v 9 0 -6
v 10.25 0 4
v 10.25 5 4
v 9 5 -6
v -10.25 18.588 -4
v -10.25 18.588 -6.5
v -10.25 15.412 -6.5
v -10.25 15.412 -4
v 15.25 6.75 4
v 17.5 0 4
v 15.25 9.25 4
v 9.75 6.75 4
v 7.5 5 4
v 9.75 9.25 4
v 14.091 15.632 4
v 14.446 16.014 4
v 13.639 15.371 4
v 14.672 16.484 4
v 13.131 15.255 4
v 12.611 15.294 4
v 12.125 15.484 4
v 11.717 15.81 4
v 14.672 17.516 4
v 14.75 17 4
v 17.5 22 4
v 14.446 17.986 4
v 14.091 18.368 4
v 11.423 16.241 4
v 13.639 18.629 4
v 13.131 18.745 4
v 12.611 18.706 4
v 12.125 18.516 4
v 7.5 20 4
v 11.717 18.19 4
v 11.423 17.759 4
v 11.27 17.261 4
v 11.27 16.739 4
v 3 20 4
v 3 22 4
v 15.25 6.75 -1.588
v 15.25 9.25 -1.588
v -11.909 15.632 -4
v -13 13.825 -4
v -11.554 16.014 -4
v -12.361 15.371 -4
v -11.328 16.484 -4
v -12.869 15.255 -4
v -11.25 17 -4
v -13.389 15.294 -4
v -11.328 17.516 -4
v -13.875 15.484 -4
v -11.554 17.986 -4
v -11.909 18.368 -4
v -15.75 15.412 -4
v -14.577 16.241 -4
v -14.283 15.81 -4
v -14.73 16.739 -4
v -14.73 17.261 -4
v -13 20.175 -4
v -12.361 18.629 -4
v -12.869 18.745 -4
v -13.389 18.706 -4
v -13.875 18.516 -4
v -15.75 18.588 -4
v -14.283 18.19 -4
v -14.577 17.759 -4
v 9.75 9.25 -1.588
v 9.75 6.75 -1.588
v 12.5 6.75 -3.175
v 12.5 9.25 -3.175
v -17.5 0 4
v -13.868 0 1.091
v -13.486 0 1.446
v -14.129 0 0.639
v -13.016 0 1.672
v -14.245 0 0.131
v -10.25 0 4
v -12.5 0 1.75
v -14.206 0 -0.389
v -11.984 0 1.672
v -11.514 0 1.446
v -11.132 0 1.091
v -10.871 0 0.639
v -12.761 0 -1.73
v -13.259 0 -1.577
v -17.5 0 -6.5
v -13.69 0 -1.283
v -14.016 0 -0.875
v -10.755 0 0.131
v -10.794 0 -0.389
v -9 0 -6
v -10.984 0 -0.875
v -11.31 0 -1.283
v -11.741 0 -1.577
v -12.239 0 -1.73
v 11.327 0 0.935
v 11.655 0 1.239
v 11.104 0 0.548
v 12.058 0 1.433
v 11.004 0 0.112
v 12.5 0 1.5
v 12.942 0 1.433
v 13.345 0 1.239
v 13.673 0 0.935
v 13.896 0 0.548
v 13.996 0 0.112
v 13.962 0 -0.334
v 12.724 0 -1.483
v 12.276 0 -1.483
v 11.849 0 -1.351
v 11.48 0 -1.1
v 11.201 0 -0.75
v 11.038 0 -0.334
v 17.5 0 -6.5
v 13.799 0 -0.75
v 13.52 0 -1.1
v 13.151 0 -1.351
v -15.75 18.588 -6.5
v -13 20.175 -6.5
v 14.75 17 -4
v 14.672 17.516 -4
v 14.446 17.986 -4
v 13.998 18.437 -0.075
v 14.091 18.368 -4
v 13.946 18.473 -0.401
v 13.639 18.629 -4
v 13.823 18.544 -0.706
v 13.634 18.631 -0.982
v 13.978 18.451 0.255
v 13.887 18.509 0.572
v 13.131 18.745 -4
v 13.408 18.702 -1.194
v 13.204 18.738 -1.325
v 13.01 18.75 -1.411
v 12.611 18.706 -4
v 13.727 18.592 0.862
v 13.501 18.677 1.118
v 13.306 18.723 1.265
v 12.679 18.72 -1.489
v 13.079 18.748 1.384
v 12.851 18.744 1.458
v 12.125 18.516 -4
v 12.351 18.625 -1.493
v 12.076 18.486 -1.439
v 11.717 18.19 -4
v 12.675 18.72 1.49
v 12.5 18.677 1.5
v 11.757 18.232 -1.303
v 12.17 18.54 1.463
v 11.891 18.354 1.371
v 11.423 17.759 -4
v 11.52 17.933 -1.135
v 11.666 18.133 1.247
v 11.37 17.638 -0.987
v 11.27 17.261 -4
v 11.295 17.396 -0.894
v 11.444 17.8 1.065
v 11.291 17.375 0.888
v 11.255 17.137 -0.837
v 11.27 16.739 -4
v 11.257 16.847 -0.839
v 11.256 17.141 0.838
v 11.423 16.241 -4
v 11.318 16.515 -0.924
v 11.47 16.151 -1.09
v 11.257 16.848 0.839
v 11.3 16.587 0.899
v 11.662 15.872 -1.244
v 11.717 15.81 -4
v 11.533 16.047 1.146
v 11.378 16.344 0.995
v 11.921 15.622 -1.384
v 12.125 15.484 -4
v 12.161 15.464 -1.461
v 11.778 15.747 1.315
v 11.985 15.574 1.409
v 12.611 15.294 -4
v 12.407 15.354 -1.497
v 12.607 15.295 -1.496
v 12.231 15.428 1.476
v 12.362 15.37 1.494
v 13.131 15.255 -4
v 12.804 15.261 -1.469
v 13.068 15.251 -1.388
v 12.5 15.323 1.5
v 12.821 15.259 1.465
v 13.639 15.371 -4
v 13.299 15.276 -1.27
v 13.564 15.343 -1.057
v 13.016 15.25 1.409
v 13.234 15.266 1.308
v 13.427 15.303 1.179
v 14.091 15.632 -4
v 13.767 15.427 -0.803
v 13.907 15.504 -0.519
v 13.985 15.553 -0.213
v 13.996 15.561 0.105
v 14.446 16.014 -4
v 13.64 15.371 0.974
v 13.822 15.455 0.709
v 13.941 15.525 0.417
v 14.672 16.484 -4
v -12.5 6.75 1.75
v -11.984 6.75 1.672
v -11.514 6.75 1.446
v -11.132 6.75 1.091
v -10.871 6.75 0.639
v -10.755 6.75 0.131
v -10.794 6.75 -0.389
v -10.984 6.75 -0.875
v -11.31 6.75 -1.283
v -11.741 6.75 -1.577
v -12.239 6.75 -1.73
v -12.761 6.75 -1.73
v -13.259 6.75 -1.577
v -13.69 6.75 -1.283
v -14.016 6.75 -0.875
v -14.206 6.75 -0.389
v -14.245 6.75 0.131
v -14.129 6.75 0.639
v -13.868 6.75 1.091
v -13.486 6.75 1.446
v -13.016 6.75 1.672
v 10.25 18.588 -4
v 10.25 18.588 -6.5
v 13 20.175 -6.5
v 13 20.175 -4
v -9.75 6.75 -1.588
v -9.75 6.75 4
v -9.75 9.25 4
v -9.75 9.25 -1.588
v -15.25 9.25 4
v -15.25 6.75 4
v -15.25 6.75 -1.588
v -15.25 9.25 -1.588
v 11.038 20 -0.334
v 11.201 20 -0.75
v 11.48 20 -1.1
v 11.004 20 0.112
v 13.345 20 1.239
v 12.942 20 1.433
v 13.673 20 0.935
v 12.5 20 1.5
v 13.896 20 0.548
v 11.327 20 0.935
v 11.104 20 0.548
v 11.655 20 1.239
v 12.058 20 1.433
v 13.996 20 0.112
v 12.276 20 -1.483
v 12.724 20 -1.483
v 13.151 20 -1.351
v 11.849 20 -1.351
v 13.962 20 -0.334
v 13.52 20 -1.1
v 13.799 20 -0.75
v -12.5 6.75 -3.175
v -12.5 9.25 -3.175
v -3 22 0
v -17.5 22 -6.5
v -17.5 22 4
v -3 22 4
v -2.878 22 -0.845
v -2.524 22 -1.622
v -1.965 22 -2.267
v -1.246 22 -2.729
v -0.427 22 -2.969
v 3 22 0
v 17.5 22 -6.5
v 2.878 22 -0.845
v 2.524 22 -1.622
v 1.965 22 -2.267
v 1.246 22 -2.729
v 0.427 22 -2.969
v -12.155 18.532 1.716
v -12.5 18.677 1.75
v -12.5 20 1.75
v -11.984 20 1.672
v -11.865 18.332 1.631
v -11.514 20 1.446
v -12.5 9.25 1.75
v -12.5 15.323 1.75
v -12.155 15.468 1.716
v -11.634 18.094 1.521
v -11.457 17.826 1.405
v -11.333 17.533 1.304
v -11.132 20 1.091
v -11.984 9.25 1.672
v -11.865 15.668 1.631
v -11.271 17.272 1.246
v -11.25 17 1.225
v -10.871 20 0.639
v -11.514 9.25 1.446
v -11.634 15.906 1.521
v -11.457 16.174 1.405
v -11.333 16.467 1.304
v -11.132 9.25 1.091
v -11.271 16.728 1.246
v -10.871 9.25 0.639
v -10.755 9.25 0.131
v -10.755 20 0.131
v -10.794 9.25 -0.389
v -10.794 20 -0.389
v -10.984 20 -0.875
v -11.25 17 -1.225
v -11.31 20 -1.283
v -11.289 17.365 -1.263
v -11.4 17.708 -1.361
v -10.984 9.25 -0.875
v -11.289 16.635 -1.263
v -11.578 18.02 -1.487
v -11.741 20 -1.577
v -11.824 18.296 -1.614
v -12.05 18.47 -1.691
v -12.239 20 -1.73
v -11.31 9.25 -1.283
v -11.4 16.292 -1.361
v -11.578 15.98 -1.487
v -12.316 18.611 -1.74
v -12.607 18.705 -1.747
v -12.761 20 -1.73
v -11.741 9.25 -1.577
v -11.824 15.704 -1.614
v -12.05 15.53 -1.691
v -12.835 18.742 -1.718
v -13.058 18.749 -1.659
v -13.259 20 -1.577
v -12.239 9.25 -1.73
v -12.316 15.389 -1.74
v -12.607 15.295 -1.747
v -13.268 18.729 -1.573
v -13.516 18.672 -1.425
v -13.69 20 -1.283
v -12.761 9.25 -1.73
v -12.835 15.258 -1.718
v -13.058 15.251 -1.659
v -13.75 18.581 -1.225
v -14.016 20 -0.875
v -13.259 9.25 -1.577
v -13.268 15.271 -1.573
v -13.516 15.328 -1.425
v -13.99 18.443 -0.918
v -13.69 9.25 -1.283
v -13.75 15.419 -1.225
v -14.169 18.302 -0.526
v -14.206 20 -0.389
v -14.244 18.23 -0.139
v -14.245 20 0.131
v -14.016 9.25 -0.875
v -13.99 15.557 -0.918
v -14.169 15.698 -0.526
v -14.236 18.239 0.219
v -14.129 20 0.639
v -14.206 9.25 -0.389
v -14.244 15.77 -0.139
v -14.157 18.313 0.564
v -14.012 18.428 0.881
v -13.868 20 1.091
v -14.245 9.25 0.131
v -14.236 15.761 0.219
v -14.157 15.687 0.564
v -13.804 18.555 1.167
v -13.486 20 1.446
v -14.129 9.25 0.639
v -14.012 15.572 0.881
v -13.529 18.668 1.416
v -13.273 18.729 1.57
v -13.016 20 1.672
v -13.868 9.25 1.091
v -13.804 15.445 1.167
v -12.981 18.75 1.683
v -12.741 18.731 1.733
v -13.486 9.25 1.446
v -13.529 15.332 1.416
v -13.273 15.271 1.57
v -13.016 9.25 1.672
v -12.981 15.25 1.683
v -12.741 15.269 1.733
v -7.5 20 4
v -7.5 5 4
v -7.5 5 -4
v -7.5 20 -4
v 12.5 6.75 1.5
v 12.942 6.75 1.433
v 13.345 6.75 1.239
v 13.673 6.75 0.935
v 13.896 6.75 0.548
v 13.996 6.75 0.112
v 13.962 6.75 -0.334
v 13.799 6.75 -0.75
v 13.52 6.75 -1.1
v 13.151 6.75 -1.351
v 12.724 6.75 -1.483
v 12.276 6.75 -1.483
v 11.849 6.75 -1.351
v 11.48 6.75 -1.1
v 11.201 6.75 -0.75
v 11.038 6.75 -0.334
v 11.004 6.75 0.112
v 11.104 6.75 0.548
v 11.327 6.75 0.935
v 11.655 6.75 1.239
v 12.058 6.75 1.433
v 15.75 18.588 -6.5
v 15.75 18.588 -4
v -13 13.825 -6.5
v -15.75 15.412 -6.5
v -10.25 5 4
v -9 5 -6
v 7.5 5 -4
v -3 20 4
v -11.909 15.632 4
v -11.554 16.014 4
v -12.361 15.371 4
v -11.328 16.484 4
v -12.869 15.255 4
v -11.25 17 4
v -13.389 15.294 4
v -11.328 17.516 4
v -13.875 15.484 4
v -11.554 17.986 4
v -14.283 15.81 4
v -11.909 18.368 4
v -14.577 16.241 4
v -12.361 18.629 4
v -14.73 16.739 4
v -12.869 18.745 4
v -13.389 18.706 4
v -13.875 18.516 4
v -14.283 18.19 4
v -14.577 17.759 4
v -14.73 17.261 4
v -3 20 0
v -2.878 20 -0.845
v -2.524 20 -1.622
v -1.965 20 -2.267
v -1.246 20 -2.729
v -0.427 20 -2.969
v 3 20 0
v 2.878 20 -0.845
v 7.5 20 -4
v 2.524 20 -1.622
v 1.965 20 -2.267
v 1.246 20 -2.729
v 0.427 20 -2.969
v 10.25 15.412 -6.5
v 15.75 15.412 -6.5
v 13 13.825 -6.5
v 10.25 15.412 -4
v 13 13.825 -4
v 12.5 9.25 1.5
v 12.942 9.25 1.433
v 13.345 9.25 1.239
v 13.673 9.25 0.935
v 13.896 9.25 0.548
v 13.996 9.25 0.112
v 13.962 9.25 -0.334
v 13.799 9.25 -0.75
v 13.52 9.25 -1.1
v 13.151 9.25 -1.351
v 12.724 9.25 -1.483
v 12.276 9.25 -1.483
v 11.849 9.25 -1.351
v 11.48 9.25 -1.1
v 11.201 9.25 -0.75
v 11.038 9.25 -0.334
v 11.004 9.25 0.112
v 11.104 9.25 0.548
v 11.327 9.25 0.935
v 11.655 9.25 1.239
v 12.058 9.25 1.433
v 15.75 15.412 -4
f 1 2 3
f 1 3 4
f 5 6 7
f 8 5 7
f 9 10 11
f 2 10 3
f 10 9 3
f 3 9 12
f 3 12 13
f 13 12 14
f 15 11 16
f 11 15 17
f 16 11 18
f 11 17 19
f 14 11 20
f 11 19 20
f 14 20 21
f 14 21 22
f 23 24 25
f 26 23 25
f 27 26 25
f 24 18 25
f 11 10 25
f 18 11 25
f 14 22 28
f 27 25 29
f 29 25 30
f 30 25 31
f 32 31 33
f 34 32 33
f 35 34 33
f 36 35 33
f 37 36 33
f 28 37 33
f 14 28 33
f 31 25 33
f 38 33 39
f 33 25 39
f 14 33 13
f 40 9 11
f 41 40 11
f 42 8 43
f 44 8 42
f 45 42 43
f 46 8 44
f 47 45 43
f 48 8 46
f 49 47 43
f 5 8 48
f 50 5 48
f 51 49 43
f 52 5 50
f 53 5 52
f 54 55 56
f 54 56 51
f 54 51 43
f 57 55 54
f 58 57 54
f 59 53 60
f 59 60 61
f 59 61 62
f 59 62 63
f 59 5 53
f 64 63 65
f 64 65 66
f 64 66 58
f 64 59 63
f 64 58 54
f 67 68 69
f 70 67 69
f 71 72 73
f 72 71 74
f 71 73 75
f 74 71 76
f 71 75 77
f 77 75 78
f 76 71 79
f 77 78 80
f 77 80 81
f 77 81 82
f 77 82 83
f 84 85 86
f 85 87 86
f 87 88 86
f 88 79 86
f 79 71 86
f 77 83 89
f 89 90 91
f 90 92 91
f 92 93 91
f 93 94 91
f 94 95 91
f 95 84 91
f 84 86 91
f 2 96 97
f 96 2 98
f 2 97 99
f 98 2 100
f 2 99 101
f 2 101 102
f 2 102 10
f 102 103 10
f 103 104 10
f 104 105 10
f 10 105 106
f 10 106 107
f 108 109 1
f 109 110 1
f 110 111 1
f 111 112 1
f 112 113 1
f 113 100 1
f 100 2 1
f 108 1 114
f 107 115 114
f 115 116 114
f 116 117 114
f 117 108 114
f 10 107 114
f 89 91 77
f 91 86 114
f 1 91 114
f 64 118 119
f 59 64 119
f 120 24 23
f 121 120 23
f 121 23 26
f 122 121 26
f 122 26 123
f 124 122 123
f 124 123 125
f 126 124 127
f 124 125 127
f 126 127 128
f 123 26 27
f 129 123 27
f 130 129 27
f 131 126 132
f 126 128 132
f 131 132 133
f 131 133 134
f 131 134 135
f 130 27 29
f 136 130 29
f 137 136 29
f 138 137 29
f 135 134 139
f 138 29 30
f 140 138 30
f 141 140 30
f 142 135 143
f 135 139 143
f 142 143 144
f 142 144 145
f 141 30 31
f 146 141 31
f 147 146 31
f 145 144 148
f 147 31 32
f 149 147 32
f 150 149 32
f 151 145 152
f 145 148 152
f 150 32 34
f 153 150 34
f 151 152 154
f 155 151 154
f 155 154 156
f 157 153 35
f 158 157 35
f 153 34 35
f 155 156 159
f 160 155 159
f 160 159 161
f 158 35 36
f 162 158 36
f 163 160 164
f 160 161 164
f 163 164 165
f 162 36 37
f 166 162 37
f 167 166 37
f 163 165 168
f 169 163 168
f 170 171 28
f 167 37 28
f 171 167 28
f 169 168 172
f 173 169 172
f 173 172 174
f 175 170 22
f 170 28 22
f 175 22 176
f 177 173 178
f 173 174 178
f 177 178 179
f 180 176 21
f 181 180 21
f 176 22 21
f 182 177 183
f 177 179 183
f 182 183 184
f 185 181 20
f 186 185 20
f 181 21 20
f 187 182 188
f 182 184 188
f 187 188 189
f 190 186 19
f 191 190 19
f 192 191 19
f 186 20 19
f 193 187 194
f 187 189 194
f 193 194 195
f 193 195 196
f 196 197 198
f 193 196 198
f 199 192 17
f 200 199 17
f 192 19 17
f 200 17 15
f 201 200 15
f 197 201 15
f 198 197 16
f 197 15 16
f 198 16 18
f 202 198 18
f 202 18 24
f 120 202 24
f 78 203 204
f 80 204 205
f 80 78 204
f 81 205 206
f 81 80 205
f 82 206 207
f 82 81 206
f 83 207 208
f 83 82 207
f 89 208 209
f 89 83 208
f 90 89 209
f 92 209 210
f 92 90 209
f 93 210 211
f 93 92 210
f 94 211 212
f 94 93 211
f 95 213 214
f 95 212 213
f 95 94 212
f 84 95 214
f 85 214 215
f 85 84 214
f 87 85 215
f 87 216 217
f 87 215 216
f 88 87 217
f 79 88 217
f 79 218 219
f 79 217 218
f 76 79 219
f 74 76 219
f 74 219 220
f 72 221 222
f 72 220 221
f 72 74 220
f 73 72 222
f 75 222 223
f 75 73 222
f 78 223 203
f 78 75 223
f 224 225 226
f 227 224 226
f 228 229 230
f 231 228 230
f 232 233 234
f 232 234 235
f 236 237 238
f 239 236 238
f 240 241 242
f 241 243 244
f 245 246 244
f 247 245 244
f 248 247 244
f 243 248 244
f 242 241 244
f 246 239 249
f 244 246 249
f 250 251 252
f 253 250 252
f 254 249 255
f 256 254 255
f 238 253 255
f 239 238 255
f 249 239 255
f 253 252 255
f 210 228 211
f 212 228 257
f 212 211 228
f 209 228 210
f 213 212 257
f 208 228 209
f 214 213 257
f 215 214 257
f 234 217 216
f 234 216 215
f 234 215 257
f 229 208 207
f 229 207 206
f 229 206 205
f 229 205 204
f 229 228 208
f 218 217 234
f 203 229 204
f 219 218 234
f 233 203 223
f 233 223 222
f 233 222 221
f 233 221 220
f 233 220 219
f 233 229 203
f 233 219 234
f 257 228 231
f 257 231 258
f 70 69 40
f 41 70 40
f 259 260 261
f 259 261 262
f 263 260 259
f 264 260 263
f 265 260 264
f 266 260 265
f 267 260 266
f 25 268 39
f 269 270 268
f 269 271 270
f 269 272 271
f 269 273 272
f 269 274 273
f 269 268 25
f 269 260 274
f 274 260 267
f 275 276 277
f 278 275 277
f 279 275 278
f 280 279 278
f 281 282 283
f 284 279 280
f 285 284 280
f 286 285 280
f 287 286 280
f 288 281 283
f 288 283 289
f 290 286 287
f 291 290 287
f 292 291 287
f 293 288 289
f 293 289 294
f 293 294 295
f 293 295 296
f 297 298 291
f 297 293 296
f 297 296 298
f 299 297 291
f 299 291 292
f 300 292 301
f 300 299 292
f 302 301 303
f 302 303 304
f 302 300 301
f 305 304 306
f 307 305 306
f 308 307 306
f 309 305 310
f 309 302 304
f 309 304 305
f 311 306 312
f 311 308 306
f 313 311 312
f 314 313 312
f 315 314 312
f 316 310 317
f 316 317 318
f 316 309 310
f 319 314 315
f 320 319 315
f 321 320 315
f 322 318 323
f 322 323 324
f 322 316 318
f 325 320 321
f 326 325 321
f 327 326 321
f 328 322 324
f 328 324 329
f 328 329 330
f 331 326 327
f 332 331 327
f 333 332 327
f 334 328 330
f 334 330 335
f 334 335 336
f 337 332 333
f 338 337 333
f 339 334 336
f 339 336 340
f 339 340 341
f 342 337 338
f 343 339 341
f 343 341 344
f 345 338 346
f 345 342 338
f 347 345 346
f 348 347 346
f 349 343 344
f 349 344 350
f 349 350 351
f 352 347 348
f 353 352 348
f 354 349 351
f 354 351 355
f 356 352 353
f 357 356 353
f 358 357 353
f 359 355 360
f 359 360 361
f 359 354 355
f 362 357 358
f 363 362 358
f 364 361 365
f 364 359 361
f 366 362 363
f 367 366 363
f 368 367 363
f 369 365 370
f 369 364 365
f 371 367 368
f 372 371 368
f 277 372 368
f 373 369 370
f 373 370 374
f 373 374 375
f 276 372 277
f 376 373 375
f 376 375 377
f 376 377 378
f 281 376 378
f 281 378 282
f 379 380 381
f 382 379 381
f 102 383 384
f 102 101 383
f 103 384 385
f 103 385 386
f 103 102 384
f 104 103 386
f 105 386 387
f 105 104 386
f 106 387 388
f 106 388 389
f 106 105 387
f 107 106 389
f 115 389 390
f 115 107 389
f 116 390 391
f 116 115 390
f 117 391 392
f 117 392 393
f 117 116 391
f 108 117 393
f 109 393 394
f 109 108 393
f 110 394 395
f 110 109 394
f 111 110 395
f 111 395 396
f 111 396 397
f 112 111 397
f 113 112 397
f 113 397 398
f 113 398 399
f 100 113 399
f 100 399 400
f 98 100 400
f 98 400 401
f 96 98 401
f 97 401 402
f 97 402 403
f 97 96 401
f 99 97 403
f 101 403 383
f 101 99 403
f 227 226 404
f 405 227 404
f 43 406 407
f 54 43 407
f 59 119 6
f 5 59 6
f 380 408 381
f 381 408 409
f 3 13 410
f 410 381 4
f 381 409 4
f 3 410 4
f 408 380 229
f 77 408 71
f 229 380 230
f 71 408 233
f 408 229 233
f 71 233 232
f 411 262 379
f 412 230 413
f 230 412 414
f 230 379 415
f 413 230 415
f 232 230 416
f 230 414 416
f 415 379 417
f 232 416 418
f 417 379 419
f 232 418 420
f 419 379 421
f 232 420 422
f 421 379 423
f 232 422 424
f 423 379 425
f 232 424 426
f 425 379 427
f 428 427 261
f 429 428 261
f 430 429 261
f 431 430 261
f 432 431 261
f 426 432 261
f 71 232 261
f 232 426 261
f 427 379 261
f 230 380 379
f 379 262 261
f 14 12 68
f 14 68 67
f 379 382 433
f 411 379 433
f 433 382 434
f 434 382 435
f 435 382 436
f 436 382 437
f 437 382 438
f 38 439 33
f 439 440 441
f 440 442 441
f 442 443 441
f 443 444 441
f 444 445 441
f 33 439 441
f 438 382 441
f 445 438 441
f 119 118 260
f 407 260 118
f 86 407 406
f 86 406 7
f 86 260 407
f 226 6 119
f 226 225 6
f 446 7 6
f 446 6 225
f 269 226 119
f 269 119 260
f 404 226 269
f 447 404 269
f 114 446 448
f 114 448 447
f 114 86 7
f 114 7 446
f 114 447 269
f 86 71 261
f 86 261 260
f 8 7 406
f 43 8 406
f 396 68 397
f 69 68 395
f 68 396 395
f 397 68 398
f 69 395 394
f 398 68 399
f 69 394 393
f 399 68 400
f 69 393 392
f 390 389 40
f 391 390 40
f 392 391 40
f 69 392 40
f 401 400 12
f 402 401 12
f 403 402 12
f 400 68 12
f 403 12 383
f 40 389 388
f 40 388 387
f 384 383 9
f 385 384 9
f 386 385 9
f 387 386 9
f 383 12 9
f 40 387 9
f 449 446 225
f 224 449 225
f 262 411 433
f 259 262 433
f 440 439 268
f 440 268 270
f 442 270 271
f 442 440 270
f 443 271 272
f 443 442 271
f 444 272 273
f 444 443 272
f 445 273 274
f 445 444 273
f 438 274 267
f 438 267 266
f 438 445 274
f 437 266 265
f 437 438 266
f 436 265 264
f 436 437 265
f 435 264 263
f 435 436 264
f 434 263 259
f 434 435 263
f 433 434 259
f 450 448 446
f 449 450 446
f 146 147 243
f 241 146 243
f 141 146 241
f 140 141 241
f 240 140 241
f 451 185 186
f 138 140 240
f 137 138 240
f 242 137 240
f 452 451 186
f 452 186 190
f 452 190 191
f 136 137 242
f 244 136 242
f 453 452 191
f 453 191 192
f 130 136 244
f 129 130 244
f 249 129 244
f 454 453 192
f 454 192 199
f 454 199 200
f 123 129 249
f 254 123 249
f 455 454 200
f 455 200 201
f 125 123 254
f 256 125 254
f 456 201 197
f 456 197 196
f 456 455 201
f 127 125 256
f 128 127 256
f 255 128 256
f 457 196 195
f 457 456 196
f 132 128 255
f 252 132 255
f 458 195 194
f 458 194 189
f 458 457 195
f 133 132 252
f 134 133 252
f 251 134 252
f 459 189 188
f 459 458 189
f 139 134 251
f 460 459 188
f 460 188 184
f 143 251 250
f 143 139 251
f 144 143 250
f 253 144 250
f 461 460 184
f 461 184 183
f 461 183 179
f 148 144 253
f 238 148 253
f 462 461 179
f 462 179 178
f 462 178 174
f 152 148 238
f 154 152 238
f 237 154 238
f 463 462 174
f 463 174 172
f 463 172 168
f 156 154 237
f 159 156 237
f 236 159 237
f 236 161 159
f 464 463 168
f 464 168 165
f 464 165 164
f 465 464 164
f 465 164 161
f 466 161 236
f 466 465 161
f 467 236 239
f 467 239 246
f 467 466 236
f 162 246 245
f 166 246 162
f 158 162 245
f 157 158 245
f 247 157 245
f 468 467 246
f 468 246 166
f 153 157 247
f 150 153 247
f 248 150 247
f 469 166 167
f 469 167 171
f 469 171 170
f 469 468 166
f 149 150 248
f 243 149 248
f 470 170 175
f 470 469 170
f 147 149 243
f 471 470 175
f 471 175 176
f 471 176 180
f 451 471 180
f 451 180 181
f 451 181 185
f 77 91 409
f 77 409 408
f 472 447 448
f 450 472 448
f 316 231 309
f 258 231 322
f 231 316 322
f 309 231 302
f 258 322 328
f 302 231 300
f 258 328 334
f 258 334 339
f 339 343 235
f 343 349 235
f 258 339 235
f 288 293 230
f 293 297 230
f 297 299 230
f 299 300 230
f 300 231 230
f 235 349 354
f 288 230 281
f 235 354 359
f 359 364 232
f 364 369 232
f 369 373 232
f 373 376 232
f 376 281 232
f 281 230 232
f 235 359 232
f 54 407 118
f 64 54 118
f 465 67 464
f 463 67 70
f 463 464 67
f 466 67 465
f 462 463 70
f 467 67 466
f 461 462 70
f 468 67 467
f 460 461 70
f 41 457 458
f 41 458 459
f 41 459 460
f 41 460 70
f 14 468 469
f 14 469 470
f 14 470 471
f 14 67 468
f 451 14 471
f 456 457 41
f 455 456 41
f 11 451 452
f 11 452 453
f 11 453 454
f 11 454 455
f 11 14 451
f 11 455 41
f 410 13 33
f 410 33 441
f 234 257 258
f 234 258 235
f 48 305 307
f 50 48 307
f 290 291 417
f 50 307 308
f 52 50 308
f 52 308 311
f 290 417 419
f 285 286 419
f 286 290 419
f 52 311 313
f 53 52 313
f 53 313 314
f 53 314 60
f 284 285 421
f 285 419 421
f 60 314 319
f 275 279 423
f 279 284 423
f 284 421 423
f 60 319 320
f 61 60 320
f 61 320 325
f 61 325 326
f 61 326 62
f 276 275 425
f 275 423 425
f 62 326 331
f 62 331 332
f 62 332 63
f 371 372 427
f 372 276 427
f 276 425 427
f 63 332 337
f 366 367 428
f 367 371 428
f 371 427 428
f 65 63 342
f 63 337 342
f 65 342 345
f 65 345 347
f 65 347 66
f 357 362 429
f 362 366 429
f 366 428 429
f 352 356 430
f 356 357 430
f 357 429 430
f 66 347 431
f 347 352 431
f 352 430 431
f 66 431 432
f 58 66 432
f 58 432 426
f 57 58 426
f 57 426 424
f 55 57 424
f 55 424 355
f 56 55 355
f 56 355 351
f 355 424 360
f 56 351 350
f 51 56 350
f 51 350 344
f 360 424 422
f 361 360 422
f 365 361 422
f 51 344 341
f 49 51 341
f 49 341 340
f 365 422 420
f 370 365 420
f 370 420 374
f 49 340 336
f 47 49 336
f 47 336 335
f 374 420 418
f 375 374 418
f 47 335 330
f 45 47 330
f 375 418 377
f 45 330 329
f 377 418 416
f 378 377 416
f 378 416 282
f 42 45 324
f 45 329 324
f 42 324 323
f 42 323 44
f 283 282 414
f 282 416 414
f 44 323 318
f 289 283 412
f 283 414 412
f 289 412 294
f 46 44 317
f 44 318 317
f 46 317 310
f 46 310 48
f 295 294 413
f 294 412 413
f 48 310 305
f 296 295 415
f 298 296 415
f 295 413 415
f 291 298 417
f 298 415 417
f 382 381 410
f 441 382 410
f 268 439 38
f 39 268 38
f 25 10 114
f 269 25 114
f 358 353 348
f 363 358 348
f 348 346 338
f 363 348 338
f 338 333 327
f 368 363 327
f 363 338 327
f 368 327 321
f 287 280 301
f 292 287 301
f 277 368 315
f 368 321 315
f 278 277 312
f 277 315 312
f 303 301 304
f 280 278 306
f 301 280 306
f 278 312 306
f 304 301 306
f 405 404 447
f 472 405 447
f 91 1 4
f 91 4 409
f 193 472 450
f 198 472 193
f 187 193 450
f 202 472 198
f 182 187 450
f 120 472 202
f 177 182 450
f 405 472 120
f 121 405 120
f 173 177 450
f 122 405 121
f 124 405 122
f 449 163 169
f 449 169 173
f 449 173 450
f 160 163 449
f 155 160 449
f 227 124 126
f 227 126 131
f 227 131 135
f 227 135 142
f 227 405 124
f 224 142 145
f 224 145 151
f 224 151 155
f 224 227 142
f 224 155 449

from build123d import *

# Parameters (mm, degrees)
ESQUISSE1_W             = 35
ESQUISSE1_H             = 13
ESQUISSE1_R             = 1.75
ESQUISSE1_R_2           = 1.5
BOSS_EXTRU_1_DEPTH      = 5
ESQUISSE2_W             = 35
ESQUISSE2_H             = 13
ESQUISSE2_R             = 1.5
ESQUISSE2_R_2           = 1.75
ESQUISSE2_W_2           = 15
ESQUISSE2_H_2           = 8
BOSS_EXTRU_2_DEPTH      = 15
ESQUISSE3_W             = 35
ESQUISSE3_H             = 13
ESQUISSE3_R             = 3
BOSS_EXTRU_3_DEPTH      = 2
ESQUISSE9_R             = 1.75
ENL_V_MAT_EXTRU_5_DEPTH = 31.971761332
ESQUISSE5_W             = 52.735375718
ESQUISSE5_H             = 32.07387294
ENL_V_MAT_EXTRU_1_DEPTH = 31.008332211
ENL_V_MAT_EXTRU_2_DEPTH = 28.358728137
ESQUISSE4_W             = 5.5
ESQUISSE4_H             = 2.5
ENL_V_MAT_EXTRU_3_DEPTH = 4
ENL_V_MAT_EXTRU_4_DEPTH = 2.5
ENL_V_MAT_EXTRU_6_DEPTH = 2.5


with BuildPart() as part:
    # Esquisse1 → Boss.-Extru.1 (new body)
    with BuildSketch(Plane(origin=(0, 0, 0), x_dir=(1, 0, 0), z_dir=(0, 1, 0))):
        Rectangle(ESQUISSE1_W, ESQUISSE1_H)
        with Locations(Location((-12.5, 0, 0), (0, 0, 270))):
            Circle(ESQUISSE1_R, mode=Mode.SUBTRACT)
        with Locations(Location((12.5, 0, 0), (0, 0, 270))):
            Circle(ESQUISSE1_R_2, mode=Mode.SUBTRACT)
        Polygon((-10.5, -6), (10.5, -6), (9, 6), (-9, 6), align=None, mode=Mode.SUBTRACT)
    extrude(amount=BOSS_EXTRU_1_DEPTH)

    # Esquisse2 → Boss.-Extru.2 (add)
    with BuildSketch(Plane(origin=(0, 5, 0), x_dir=(1, 0, 0), z_dir=(0, 1, 0))):
        Rectangle(ESQUISSE2_W, ESQUISSE2_H)
        with Locations(Location((12.5, 0, 0), (0, 0, 270))):
            Circle(ESQUISSE2_R, mode=Mode.SUBTRACT)
        with Locations(Location((-12.5, 0, 0), (0, 0, 270))):
            Circle(ESQUISSE2_R_2, mode=Mode.SUBTRACT)
        Rectangle(ESQUISSE2_W_2, ESQUISSE2_H_2, mode=Mode.SUBTRACT)
    extrude(amount=BOSS_EXTRU_2_DEPTH)

    # Esquisse3 → Boss.-Extru.3 (add)
    with BuildSketch(Plane(origin=(0, 20, 0), x_dir=(1, 0, 0), z_dir=(0, 1, 0))):
        Rectangle(ESQUISSE3_W, ESQUISSE3_H)
        with Locations(Location((0, 0, 0), (0, 0, 270))):
            Circle(ESQUISSE3_R, mode=Mode.SUBTRACT)
    extrude(amount=BOSS_EXTRU_3_DEPTH)

    # Esquisse9 → Enlèv. mat.-Extru.5 (cut, through all)
    with BuildSketch(Plane.XY.offset(6.5)):
        with Locations((-13, 17)):
            Circle(ESQUISSE9_R)
        with Locations((13, 17)):
            Circle(ESQUISSE9_R)
    extrude(amount=-ENL_V_MAT_EXTRU_5_DEPTH, mode=Mode.SUBTRACT)

    # Esquisse5 → Enlèv. mat.-Extru.1 (cut, through all)
    with BuildSketch(Plane(origin=(0, 0, 4), x_dir=(-1, 0, 0), z_dir=(0, 0, -1))):
        with Locations((3.176053458, 10.251854402)):
            Rectangle(ESQUISSE5_W, ESQUISSE5_H)
    extrude(amount=-ENL_V_MAT_EXTRU_1_DEPTH, mode=Mode.SUBTRACT)

    # Esquisse6 → Enlèv. mat.-Extru.2 (cut, through all)
    with BuildSketch(Plane.XZ.offset(-20)):
        with BuildLine():
            Line((-3, 4), (-3, 0))
            ThreePointArc((-3, 0), (0, 3), (3, 0))
            Line((3, 0), (3, 4))
            Line((3, 4), (-3, 4))
        make_face()
    extrude(amount=-ENL_V_MAT_EXTRU_2_DEPTH, mode=Mode.SUBTRACT)

    # Esquisse4 → Enlèv. mat.-Extru.3 (cut)
    with BuildSketch(Plane(origin=(0, 0, 4), x_dir=(-1, 0, 0), z_dir=(0, 0, -1))):
        with Locations((12.5, 8)):
            Rectangle(ESQUISSE4_W, ESQUISSE4_H)
    enl_v_mat_extru_3 = extrude(amount=ENL_V_MAT_EXTRU_3_DEPTH, mode=Mode.SUBTRACT)

    # Esquisse7 → Enlèv. mat.-Extru.4 (cut)
    with BuildSketch(Plane(origin=(0, 6.75, 0), x_dir=(1, 0, 0), z_dir=(0, 1, 0))):
        Polygon((-9.75, -1.58771324), (-9.75, 1.58771324), (-12.5, 3.175426481), (-15.25, 1.58771324), (-15.25, -1.58771324), (-12.5, -3.175426481), align=None)
    enl_v_mat_extru_4 = extrude(amount=ENL_V_MAT_EXTRU_4_DEPTH, mode=Mode.SUBTRACT)

    # Symétrie1: Enlèv. mat.-Extru.3, Enlèv. mat.-Extru.4 across plane
    add(enl_v_mat_extru_3.mirror(Plane.ZY), mode=Mode.SUBTRACT)
    add(enl_v_mat_extru_4.mirror(Plane.ZY), mode=Mode.SUBTRACT)

    # Esquisse10 → Enlèv. mat.-Extru.6 (cut)
    with BuildSketch(Plane(origin=(0, 0, -6.5), x_dir=(-1, 0, 0), z_dir=(0, 0, -1))):
        Polygon((-10.25, 15.41228676), (-10.25, 18.58771324), (-13, 20.175426481), (-15.75, 18.58771324), (-15.75, 15.41228676), (-13, 13.824573519), align=None)
        Polygon((13, 13.824573519), (15.75, 15.41228676), (15.75, 18.58771324), (13, 20.175426481), (10.25, 18.58771324), (10.25, 15.41228676), align=None)
    extrude(amount=-ENL_V_MAT_EXTRU_6_DEPTH, mode=Mode.SUBTRACT)


solid = part.part
